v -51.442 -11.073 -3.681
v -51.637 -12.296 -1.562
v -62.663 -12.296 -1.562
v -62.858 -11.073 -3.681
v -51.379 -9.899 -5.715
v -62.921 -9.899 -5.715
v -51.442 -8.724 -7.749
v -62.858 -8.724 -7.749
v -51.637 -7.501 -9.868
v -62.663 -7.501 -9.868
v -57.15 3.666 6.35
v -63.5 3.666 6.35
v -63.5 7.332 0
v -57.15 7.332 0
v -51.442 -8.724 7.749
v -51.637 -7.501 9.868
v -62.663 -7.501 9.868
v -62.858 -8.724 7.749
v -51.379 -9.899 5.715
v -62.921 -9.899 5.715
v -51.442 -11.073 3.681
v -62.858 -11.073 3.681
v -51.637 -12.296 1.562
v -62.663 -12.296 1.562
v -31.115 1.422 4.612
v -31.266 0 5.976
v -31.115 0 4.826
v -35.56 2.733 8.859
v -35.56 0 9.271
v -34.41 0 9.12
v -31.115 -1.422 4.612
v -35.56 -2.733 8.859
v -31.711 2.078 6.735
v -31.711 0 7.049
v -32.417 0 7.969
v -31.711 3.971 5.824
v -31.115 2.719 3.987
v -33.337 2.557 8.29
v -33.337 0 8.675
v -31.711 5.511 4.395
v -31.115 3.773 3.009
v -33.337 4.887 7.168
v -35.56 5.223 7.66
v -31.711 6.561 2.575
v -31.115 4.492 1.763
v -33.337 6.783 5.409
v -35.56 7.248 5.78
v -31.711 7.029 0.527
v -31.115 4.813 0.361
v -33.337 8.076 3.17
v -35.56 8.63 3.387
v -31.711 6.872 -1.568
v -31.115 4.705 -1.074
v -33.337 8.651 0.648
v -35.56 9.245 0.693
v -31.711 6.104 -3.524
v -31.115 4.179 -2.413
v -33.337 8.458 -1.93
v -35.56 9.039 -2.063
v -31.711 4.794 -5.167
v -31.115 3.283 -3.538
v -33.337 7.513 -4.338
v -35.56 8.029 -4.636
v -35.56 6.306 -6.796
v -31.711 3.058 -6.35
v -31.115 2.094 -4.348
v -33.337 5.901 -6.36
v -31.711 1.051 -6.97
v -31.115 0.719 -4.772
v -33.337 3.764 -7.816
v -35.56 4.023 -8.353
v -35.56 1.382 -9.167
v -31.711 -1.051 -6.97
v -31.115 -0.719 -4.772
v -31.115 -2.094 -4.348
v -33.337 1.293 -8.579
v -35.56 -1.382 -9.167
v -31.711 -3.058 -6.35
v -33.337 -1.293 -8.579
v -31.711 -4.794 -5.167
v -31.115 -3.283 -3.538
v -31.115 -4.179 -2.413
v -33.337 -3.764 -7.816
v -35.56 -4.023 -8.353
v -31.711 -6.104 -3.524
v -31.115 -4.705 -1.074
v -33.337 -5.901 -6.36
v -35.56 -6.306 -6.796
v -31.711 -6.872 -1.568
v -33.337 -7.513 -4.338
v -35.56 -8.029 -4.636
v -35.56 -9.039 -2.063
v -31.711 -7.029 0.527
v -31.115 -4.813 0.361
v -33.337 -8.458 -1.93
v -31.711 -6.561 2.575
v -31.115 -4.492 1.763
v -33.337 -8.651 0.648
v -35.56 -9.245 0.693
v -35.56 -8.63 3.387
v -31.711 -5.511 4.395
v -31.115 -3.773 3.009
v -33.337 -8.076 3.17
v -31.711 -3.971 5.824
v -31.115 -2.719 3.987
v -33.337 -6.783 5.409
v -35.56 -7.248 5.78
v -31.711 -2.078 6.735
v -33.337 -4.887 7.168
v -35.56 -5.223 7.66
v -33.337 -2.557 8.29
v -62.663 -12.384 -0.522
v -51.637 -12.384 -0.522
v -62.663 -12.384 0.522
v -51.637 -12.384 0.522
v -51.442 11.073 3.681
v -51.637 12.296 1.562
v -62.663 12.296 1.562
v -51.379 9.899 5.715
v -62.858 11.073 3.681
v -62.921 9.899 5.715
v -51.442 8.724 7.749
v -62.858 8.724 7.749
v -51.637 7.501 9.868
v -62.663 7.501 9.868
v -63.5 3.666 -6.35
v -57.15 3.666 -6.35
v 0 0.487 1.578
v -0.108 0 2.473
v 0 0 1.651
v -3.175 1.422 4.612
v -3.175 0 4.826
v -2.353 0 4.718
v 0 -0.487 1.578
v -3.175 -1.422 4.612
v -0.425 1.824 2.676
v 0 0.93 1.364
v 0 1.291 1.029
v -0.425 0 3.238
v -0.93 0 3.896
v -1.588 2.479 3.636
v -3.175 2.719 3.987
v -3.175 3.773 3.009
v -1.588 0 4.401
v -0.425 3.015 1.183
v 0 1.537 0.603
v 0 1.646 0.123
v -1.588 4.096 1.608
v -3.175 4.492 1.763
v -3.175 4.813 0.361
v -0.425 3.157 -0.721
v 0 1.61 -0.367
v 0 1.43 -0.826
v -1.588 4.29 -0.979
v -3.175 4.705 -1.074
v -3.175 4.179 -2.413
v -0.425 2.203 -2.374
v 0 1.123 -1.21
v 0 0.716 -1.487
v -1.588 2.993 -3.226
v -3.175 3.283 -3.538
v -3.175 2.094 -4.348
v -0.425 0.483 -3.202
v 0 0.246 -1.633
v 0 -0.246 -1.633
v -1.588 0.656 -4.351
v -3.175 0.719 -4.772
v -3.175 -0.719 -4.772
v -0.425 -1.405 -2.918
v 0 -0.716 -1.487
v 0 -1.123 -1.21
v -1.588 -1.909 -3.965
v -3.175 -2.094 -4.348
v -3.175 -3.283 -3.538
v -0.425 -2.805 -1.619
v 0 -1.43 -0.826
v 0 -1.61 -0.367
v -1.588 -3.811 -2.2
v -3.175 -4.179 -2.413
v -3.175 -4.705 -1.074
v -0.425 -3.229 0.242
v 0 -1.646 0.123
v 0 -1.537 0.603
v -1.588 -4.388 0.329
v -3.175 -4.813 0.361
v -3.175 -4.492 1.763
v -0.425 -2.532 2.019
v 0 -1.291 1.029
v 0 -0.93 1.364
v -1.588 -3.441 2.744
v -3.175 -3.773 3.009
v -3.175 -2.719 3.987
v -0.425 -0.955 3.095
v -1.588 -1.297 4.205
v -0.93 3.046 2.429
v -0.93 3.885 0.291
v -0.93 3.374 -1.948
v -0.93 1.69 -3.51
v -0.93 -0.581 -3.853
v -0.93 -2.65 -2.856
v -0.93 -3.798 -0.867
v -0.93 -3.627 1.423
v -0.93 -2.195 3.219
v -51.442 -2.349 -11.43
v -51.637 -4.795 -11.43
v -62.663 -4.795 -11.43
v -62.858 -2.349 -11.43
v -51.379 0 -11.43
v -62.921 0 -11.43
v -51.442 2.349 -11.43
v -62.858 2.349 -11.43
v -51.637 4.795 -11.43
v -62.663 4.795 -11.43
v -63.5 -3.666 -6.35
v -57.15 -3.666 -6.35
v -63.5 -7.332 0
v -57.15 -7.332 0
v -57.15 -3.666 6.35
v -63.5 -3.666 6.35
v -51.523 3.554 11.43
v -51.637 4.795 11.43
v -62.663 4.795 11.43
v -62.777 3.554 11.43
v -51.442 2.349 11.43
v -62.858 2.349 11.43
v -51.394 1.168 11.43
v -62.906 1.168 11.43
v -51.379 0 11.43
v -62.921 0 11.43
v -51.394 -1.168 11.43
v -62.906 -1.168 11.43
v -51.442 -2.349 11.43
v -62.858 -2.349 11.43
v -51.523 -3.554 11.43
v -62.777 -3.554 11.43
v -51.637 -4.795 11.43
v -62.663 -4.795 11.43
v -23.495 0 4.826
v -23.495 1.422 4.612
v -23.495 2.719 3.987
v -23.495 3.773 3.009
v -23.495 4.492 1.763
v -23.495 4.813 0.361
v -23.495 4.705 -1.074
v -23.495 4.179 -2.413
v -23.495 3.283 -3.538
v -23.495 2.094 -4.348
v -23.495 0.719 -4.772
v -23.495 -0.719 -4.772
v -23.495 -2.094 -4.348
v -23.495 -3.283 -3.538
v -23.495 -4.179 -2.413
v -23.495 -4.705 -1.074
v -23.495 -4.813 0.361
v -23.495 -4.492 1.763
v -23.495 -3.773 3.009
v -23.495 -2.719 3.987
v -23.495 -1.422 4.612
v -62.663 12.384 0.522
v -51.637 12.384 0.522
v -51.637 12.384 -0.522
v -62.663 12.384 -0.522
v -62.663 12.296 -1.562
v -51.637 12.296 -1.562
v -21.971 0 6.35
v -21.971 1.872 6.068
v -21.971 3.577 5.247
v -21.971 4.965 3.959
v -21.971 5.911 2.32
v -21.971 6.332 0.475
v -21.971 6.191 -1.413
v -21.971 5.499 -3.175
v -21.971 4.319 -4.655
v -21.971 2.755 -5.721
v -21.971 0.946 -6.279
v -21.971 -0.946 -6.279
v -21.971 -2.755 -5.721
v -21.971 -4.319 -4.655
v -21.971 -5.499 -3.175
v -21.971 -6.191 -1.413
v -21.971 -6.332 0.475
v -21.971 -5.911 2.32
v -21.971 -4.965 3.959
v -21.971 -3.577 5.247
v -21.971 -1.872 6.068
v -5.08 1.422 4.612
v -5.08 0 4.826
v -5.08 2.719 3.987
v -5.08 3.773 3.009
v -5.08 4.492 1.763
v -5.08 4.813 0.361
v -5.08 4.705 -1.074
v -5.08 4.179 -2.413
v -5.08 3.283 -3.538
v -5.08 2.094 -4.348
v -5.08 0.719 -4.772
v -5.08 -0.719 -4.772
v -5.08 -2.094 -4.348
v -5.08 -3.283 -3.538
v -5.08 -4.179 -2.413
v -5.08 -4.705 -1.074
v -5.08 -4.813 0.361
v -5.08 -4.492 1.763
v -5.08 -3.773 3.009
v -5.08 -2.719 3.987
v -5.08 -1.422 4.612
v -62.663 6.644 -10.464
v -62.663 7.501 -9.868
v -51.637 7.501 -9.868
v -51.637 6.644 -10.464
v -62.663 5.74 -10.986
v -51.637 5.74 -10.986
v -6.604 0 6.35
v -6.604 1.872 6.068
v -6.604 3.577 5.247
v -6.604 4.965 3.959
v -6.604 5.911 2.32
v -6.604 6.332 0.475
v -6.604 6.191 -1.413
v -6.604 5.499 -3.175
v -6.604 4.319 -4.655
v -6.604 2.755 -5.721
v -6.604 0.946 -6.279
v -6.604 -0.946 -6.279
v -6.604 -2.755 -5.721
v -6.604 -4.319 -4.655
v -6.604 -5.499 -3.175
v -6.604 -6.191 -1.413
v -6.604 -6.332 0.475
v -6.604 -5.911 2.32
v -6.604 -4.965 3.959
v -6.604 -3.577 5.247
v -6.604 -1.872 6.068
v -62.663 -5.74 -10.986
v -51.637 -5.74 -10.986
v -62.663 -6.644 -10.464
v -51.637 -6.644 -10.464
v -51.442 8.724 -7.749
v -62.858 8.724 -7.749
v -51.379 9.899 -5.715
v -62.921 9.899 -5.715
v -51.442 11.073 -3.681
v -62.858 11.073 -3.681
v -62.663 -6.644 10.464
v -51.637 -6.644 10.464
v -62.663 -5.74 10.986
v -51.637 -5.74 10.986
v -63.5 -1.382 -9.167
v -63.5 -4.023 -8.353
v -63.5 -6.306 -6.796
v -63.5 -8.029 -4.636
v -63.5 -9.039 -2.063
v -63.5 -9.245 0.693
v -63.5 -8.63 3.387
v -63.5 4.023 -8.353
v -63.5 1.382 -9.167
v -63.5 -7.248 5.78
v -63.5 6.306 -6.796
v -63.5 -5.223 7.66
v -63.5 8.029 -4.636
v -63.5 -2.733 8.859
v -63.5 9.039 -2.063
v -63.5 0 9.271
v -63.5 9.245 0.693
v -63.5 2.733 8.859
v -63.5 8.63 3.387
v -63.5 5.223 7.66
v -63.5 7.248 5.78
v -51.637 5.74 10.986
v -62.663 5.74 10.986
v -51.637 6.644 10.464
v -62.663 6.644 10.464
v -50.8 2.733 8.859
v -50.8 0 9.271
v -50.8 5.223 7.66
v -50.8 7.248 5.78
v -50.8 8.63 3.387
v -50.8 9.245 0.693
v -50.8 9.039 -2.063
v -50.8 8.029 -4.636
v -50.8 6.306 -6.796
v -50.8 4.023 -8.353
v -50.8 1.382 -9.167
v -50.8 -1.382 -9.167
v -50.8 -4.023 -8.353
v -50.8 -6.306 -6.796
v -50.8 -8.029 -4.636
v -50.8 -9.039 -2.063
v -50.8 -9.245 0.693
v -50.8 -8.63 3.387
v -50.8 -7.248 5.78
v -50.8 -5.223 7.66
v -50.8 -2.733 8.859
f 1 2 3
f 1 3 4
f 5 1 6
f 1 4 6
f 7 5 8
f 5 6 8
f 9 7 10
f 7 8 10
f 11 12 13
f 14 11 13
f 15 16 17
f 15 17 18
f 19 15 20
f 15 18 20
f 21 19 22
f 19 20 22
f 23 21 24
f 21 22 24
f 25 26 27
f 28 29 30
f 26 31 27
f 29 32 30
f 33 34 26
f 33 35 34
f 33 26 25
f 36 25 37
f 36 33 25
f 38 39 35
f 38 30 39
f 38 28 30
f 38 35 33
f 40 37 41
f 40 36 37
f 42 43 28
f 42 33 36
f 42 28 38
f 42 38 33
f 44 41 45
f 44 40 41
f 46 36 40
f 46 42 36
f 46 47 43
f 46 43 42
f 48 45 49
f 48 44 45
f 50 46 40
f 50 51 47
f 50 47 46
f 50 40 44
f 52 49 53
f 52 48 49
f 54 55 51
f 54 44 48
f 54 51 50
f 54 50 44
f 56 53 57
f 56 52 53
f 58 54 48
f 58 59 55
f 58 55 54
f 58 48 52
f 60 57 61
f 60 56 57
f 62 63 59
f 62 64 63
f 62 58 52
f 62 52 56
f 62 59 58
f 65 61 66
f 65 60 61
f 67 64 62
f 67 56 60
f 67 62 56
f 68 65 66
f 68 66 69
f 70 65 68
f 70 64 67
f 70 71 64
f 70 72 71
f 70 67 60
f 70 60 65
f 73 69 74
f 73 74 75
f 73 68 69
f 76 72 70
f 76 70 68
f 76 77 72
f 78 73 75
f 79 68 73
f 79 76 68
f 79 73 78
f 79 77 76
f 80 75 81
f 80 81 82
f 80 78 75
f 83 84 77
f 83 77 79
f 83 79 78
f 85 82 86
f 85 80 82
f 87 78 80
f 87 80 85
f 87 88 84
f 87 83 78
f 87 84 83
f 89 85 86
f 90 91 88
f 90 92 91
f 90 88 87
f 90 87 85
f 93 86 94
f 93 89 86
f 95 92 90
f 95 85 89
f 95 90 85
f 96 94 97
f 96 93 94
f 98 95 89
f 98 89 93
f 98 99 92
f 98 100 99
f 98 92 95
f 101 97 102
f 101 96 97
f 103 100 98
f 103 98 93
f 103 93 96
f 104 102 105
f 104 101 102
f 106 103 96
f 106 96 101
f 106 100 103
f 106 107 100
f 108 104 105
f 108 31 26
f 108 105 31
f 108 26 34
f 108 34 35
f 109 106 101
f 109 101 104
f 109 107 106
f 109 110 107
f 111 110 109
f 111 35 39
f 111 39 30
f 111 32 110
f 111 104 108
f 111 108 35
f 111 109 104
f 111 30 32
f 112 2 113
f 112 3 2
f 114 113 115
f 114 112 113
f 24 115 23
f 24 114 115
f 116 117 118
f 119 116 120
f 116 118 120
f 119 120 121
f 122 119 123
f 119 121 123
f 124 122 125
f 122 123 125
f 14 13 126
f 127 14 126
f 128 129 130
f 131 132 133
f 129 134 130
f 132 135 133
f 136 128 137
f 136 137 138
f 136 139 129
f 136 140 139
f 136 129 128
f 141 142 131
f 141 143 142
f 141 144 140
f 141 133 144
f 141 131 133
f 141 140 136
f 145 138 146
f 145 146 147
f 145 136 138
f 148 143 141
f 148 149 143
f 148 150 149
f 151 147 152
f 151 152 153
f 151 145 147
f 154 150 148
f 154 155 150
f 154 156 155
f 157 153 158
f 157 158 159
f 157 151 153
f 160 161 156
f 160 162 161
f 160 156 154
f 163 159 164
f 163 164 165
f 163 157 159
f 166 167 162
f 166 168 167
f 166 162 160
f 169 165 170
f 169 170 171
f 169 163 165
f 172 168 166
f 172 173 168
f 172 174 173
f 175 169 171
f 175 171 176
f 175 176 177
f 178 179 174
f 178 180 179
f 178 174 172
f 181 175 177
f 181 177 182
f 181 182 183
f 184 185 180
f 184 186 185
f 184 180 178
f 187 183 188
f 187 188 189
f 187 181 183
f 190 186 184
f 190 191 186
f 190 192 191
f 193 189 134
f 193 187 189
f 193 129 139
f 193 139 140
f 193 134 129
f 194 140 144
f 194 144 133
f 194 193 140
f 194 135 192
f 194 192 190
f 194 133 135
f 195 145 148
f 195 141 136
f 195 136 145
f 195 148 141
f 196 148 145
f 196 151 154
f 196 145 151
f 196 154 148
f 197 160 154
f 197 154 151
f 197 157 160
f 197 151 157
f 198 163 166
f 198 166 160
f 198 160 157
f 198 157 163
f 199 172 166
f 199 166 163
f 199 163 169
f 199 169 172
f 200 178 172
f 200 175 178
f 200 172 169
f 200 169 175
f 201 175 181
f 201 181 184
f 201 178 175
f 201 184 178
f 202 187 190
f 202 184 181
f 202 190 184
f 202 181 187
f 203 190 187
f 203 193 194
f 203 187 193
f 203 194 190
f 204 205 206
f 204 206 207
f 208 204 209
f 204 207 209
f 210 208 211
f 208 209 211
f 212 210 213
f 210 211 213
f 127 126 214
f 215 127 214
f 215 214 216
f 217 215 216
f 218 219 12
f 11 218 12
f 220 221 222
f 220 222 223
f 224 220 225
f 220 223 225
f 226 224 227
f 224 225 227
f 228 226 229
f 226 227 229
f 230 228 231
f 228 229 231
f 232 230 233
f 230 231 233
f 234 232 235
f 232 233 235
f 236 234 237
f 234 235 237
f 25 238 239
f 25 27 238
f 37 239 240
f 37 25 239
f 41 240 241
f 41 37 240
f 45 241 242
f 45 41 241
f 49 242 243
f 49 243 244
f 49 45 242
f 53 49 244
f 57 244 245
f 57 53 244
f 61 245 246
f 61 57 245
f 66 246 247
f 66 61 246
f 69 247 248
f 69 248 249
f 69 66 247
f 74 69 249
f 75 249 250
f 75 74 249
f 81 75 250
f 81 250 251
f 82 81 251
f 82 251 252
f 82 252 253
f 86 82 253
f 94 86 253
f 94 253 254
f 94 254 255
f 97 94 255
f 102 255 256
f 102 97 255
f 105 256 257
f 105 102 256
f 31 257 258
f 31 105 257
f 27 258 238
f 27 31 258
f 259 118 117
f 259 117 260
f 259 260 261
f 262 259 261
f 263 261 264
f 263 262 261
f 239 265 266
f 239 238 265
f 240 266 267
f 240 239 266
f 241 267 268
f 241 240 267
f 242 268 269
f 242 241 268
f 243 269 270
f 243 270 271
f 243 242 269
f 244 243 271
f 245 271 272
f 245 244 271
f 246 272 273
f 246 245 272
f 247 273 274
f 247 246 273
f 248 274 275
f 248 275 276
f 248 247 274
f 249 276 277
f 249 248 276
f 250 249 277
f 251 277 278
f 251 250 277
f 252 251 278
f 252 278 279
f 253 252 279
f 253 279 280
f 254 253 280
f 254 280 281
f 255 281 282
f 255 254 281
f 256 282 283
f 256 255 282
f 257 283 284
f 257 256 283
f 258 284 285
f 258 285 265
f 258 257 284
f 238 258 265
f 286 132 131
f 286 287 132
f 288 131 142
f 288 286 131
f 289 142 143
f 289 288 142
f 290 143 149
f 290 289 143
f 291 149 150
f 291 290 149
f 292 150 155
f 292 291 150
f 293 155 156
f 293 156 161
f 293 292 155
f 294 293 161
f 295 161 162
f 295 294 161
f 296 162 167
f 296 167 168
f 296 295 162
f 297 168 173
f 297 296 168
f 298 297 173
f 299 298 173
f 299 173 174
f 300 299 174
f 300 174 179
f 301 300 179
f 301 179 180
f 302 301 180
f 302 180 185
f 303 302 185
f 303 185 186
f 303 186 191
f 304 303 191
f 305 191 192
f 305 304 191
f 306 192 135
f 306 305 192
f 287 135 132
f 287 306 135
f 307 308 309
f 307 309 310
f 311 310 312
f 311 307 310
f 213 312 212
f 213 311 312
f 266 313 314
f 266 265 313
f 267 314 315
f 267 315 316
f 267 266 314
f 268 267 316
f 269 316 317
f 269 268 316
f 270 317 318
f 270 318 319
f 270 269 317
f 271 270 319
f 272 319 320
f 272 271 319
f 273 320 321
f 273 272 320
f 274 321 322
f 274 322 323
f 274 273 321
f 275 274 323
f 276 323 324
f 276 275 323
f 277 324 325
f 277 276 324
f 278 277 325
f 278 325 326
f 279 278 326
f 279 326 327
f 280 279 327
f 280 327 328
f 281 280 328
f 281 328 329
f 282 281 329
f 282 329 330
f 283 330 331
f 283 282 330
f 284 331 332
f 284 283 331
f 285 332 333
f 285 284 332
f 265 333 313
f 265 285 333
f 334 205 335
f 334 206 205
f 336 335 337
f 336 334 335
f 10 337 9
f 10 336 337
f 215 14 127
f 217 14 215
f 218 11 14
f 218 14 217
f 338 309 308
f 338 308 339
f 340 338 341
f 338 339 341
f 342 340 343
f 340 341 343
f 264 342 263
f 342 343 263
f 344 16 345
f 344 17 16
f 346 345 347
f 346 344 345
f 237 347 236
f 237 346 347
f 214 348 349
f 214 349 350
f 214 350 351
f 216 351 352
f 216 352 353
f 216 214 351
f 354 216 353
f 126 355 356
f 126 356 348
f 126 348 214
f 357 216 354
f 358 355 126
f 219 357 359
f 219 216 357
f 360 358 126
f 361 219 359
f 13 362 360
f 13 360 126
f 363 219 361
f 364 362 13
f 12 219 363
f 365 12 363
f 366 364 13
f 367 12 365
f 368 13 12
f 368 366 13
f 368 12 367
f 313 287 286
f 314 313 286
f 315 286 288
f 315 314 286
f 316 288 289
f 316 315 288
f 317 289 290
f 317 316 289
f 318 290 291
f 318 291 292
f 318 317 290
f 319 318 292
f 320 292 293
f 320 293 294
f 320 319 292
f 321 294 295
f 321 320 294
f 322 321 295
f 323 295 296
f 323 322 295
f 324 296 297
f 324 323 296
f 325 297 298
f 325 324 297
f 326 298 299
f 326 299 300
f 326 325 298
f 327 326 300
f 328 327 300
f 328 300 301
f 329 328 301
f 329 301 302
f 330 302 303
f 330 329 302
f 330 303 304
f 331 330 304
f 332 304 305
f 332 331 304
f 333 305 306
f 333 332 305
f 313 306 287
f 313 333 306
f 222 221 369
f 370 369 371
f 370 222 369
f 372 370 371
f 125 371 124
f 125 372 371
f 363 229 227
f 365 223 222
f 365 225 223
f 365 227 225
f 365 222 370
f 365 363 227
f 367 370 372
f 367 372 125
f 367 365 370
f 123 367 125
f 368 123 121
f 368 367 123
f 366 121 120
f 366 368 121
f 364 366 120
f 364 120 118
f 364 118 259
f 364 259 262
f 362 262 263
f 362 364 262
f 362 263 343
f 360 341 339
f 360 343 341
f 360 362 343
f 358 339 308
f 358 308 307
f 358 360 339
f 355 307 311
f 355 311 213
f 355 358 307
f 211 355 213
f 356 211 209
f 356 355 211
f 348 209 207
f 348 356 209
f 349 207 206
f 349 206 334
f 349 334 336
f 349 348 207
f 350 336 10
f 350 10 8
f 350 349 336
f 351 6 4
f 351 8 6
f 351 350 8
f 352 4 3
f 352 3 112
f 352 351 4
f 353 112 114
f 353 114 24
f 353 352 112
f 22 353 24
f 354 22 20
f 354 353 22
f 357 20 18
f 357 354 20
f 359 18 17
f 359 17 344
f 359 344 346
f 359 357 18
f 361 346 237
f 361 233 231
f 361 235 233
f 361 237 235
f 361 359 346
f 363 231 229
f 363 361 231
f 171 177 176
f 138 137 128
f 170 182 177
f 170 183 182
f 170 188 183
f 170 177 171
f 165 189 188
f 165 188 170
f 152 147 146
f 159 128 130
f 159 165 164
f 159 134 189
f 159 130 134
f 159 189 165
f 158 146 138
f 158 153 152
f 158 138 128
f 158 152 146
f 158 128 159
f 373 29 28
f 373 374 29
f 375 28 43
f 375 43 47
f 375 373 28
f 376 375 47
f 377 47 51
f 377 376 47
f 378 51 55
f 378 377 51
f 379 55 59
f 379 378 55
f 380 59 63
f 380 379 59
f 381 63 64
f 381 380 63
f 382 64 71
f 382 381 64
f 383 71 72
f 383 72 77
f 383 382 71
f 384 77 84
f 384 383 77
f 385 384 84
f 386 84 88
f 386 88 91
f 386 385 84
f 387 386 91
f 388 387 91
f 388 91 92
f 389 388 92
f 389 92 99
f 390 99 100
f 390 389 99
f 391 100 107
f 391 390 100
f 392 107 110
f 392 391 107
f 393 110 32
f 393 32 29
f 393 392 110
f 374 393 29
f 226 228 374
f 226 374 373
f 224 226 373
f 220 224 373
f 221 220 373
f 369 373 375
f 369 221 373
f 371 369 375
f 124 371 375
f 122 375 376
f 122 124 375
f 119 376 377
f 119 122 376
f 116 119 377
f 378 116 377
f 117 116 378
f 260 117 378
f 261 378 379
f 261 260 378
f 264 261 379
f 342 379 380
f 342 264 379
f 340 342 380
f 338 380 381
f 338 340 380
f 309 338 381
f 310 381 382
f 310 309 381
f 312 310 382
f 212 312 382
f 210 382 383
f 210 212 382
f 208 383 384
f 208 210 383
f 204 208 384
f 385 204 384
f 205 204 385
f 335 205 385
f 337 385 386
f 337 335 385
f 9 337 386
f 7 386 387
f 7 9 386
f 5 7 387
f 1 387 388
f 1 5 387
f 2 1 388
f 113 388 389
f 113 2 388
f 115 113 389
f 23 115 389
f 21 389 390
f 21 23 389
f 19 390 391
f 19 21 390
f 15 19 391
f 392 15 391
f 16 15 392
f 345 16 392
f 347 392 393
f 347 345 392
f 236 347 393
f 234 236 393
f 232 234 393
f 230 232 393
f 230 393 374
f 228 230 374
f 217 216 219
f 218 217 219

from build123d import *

# Parameters (mm, degrees)
F3_DEPTH = 6.35
F4_R     = 15.610651
F5_DEPTH = 25.4


with BuildPart() as f1:
    # F0 (on Front) → F1 (revolve)
    with BuildSketch(Plane.XZ):
        with BuildLine():
            Line((-63.5, 0), (0, 0))
            Line((0, 0), (0, 1.651))
            ThreePointArc((0, 1.651), (-0.929936, 3.896064), (-3.175, 4.826))
            Line((-3.175, 4.826), (-5.08, 4.826))
            Line((-5.08, 4.826), (-6.604, 6.35))
            Line((-6.604, 6.35), (-21.971, 6.35))
            Line((-21.971, 6.35), (-23.495, 4.826))
            Line((-23.495, 4.826), (-31.115, 4.826))
            ThreePointArc((-31.115, 4.826), (-32.41691, 7.96909), (-35.56, 9.271))
            Line((-35.56, 9.271), (-50.8, 9.271))
            Line((-50.8, 9.271), (-51.637127, 12.3952))
            Line((-51.637127, 12.3952), (-62.662873, 12.3952))
            Line((-62.662873, 12.3952), (-63.5, 9.271))
            Line((-63.5, 9.271), (-63.5, 0))
        make_face()
    revolve(axis=Axis((-31.75, 0, 0), (-1, 0, 0)))

    # F2 (on face) → F3 (cut)
    with BuildSketch(Plane(origin=(-63.5, 0, 0), x_dir=(0, -1, 0), z_dir=(-1, 0, 0))):
        Polygon((3.666174, 6.35), (-3.666174, 6.35), (-7.332348, 0), (-3.666174, -6.35), (3.666174, -6.35), (7.332348, 0), align=None)
    extrude(amount=-F3_DEPTH, mode=Mode.SUBTRACT)

    # F4 (on face) → F5 (cut)
    with BuildSketch(Plane(origin=(-63.5, 0, 0), x_dir=(0, -1, 0), z_dir=(-1, 0, 0))):
        Circle(F4_R)
        Polygon((-13.198227, 0), (-6.599114, 11.43), (6.599114, 11.43), (13.198227, 0), (6.599114, -11.43), (-6.599114, -11.43), align=None, mode=Mode.SUBTRACT)
    extrude(amount=-F5_DEPTH, mode=Mode.SUBTRACT)


solid = f1.part
